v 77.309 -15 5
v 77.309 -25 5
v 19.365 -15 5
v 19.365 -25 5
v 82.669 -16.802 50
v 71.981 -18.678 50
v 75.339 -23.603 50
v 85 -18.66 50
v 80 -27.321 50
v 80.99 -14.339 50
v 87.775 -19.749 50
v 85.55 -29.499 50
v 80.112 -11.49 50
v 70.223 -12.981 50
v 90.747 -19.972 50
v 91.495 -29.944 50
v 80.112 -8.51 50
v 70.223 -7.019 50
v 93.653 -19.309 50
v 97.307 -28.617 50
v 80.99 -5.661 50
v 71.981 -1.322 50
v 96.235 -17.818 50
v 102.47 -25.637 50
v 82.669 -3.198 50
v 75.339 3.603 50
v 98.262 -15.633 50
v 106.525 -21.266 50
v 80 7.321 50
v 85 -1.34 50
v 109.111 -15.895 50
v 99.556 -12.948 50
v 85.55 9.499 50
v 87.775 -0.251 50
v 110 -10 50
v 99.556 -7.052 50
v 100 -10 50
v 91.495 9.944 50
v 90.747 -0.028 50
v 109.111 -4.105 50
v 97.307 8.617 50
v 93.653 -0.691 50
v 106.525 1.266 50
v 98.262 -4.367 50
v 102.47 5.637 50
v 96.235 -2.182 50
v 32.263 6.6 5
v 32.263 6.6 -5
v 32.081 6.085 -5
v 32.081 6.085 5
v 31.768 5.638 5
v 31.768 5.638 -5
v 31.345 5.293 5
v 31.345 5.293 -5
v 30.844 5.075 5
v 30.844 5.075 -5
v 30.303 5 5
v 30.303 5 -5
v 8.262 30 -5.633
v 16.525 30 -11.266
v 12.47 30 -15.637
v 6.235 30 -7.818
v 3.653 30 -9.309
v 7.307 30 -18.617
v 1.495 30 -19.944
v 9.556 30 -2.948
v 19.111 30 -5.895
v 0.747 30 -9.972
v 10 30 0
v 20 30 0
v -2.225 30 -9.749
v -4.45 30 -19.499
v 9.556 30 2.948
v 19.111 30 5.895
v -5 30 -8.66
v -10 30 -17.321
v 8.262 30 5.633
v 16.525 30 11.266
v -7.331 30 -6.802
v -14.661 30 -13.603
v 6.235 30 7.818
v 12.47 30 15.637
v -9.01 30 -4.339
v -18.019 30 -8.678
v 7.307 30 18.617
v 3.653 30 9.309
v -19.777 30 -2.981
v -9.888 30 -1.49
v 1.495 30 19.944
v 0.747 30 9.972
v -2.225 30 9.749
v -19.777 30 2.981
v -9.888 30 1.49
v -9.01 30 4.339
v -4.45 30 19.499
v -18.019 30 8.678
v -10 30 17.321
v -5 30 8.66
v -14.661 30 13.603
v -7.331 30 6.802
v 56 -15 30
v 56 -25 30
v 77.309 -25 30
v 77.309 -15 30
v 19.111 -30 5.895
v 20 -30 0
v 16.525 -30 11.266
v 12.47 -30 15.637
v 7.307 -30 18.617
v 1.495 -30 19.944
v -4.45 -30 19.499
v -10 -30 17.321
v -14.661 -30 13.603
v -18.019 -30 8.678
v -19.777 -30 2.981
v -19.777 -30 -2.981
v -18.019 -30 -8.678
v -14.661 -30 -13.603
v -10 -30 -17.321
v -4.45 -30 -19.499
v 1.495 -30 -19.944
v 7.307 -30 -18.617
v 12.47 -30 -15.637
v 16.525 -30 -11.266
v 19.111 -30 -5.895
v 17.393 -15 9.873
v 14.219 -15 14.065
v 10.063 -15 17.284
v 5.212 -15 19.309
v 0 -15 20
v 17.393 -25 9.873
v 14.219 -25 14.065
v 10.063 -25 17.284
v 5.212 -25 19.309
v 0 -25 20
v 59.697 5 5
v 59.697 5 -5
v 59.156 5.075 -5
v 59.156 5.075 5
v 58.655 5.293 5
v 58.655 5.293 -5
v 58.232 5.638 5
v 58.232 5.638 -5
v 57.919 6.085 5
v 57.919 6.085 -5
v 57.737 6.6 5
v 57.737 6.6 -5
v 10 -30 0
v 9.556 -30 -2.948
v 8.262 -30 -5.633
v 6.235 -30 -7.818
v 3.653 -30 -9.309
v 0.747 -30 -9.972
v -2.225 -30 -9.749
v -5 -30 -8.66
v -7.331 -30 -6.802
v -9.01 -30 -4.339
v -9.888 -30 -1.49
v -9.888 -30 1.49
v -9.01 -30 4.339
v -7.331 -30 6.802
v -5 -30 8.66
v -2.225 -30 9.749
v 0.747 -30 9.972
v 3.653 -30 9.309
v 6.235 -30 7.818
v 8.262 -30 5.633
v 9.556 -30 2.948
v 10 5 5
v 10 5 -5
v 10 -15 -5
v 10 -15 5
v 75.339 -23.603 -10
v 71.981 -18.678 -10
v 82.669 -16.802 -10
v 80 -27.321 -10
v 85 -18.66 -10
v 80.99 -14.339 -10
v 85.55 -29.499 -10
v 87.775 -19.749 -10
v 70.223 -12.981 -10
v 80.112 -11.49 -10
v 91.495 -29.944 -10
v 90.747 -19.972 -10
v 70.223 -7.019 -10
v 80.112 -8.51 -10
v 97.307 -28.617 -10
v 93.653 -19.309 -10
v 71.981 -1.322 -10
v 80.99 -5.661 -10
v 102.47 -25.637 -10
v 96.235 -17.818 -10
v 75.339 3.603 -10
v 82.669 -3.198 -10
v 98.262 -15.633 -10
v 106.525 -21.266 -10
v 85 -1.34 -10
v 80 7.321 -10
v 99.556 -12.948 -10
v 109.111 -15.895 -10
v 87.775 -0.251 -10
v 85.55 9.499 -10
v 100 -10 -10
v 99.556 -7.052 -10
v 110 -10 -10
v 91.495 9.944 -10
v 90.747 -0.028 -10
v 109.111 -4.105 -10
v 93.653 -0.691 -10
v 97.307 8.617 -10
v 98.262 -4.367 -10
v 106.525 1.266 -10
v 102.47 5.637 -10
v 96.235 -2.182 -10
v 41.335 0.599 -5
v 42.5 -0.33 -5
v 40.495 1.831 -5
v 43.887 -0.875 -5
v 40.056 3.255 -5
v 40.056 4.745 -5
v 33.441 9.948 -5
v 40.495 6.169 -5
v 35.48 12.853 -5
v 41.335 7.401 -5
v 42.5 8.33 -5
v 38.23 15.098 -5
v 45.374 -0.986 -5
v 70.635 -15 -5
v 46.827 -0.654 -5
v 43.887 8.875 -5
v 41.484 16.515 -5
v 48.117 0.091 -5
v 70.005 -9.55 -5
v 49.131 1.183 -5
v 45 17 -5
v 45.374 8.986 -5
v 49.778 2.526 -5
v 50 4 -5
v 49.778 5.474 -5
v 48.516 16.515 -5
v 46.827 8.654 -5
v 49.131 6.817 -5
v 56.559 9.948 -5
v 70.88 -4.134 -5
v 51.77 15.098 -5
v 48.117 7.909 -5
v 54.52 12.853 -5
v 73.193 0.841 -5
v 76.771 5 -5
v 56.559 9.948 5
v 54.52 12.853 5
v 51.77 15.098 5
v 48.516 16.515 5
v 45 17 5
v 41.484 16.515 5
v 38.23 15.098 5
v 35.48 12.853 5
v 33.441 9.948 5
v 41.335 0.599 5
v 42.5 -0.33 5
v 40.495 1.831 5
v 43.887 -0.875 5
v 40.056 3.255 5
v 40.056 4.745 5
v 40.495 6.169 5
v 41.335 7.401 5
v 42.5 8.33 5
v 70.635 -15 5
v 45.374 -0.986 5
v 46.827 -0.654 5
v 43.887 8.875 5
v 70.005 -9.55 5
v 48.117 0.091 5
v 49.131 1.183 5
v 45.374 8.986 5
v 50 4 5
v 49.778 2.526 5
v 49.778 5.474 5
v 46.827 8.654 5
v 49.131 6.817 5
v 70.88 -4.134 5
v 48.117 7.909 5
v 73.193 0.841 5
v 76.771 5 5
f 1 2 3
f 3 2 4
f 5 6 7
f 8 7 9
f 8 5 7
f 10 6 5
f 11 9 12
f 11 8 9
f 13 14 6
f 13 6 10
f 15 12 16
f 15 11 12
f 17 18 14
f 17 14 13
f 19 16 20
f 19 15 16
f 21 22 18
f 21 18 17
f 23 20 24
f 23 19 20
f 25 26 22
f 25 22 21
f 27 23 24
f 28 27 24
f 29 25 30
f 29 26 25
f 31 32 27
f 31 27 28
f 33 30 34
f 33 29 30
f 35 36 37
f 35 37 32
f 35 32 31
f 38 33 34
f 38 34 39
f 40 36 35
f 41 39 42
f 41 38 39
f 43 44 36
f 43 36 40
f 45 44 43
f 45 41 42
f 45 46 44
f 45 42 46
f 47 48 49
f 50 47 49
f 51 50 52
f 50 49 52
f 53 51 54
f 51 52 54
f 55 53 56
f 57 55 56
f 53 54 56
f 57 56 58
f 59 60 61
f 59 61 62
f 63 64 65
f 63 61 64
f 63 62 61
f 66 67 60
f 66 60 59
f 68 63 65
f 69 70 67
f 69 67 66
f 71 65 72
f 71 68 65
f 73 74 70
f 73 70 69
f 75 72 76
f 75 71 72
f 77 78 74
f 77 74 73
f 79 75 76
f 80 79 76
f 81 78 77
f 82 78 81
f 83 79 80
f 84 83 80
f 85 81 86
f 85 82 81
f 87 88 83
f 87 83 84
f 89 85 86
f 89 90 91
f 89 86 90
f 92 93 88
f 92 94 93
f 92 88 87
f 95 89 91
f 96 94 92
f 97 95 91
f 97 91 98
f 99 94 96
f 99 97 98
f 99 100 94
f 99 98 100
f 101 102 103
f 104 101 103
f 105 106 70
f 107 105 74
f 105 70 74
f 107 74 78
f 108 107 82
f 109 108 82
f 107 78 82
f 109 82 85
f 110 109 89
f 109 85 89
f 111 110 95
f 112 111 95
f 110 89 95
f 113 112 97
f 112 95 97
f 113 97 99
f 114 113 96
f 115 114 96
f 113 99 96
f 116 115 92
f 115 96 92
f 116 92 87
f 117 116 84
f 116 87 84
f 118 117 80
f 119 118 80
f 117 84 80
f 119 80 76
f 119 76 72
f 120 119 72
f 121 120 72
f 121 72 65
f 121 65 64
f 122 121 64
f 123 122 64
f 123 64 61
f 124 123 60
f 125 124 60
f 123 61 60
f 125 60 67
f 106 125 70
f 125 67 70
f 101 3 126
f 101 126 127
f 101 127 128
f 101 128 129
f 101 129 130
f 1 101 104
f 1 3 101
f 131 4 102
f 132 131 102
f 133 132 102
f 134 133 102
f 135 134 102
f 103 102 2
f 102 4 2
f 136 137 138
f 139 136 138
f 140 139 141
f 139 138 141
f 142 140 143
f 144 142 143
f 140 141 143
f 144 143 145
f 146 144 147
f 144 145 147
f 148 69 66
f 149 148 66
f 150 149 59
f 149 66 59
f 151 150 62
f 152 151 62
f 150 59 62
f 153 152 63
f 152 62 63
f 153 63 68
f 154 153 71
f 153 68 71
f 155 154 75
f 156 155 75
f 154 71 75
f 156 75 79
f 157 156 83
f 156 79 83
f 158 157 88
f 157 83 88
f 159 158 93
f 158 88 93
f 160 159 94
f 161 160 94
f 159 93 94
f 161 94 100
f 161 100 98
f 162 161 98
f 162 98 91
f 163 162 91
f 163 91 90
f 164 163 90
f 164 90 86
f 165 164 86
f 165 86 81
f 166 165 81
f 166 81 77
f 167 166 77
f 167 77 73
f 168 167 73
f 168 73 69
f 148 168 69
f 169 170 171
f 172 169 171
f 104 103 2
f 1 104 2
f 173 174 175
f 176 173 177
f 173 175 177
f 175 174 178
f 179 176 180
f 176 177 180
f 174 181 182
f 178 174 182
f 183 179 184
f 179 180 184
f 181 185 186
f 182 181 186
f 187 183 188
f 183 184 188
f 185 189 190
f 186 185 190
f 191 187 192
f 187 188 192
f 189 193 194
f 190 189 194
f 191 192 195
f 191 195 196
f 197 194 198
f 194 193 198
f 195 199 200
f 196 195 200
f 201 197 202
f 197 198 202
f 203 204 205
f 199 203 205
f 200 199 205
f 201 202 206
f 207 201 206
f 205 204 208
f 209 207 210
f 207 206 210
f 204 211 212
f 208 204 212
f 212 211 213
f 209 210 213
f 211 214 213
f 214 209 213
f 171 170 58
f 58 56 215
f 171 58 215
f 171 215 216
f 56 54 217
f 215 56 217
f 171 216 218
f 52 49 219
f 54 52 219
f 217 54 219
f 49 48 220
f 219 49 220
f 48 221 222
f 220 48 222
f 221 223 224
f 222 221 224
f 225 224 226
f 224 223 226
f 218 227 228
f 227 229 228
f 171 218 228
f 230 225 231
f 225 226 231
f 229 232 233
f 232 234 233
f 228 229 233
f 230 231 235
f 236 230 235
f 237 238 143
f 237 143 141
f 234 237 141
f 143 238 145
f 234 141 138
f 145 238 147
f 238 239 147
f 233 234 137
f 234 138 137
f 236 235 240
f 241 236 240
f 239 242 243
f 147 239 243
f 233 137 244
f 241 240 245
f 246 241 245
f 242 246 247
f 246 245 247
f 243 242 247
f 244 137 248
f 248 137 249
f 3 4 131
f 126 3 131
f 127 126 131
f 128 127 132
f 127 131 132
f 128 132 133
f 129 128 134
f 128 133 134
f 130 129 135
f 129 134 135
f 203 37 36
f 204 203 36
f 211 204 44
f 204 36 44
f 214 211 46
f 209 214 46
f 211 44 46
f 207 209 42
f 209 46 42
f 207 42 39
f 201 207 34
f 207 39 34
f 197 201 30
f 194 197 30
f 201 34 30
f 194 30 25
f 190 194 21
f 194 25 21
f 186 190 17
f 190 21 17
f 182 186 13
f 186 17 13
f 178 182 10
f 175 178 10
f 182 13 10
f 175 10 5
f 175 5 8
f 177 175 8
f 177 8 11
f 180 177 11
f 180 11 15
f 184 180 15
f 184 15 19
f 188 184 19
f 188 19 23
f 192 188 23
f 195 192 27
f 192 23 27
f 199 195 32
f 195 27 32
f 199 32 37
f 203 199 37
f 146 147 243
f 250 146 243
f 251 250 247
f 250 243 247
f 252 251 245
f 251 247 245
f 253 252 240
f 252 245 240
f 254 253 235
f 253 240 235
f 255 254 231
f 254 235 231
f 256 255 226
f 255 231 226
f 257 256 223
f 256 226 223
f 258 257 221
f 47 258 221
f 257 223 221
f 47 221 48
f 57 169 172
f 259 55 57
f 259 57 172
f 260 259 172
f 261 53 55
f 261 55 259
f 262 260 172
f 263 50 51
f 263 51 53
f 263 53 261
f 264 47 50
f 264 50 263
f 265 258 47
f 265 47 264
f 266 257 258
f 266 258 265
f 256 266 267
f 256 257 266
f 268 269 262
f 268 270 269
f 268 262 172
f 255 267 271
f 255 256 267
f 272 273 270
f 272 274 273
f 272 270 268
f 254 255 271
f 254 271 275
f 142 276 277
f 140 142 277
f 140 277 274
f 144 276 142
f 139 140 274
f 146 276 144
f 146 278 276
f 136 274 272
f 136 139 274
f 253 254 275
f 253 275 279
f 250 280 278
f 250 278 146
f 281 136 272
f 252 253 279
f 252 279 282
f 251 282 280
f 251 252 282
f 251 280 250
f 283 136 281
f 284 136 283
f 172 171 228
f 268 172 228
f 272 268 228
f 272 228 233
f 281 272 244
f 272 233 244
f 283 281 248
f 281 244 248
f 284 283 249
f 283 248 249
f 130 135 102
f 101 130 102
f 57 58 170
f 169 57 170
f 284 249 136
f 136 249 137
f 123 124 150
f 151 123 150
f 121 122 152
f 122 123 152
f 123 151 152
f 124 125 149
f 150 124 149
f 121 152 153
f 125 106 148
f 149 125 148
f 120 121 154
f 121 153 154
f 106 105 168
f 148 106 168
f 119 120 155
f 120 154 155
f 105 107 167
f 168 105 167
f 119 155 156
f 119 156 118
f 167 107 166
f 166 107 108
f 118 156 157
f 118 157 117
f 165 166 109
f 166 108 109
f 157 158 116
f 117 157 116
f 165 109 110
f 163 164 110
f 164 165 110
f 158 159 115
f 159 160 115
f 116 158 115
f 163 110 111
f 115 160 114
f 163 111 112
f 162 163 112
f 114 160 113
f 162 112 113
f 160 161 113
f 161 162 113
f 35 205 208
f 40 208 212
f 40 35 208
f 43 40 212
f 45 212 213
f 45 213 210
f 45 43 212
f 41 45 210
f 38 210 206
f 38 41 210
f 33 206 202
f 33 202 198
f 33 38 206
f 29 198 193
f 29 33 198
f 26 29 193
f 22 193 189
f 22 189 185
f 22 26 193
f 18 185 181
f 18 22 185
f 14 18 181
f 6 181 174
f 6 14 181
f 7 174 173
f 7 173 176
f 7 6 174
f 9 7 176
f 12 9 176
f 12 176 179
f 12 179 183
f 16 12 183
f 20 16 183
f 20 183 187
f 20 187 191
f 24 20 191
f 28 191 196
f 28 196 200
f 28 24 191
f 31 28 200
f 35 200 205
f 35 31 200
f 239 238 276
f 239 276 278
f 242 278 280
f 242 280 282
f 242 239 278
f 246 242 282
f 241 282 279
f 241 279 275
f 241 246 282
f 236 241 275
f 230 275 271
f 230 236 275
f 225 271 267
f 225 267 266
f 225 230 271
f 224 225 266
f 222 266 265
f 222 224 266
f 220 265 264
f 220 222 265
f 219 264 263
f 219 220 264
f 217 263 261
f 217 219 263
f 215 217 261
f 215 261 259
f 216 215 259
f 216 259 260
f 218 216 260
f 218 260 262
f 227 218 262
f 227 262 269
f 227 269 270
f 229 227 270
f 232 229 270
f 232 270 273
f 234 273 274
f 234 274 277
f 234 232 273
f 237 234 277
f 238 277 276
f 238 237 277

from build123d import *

# Parameters (mm, degrees)
SKETCH1_W          = 20
SKETCH1_H          = 60
SKETCH2_R          = 10
CUT_EXTRUDE1_DEPTH = 61
SKETCH3_R          = 20
SKETCH3_R_2        = 10
CYL_BLUE_DEPTH     = 60
SKETCH4_R          = 5
BASE_YELLOW_DEPTH  = 10
BASE_RED_DEPTH     = 10


with BuildPart() as part:
    # Sketch1 → cyl-purple (revolve)
    with BuildSketch(Plane.XY):
        with Locations((10, 0)):
            Rectangle(SKETCH1_W, SKETCH1_H)
    revolve(axis=Axis((0, 30, 0), (0, -1, 0)))

    # Sketch2 → Cut-Extrude1 (cut, through all)
    with BuildSketch(Plane(origin=(0, 30, 0), x_dir=(1, 0, 0), z_dir=(0, 1, 0))):
        Circle(SKETCH2_R)
    extrude(amount=-CUT_EXTRUDE1_DEPTH, mode=Mode.SUBTRACT)


with BuildPart() as body_2:
    # Sketch3 → cyl-blue (new body)
    with BuildSketch(Plane.XY.offset(50)):
        with Locations((90, -10)):
            Circle(SKETCH3_R)
        with Locations((90, -10)):
            Circle(SKETCH3_R_2, mode=Mode.SUBTRACT)
    extrude(amount=-CYL_BLUE_DEPTH)


with BuildPart() as body_3:
    # Sketch4 → base-yellow (new body)
    with BuildSketch(Plane.XY.offset(-5)):
        with BuildLine():
            Line((10, -15), (70.635083269, -15))
            ThreePointArc((70.635083269, -15), (70.879673523, -4.133730706), (76.771243445, 5))
            Line((76.771243445, 5), (59.696938457, 5))
            ThreePointArc((59.696938457, 5), (58.432027393, 5.450806662), (57.737346662, 6.6))
            ThreePointArc((57.737346662, 6.6), (45, 17), (32.262653338, 6.6))
            ThreePointArc((32.262653338, 6.6), (31.567972607, 5.450806662), (30.303061543, 5))
            Line((30.303061543, 5), (10, 5))
            Line((10, 5), (10, -15))
        make_face()
        with Locations((45, 4)):
            Circle(SKETCH4_R, mode=Mode.SUBTRACT)
    extrude(amount=BASE_YELLOW_DEPTH)


with BuildPart() as body_4:
    # Sketch6 → base-red (new body)
    with BuildSketch(Plane(origin=(0, -25, 0), x_dir=(1, 0, 0), z_dir=(0, 1, 0))):
        with BuildLine():
            Line((0, -20), (56, -30))
            Line((56, -30), (77.309100809, -30))
            Line((77.309100809, -30), (77.309100809, -5))
            Line((77.309100809, -5), (19.364916731, -5))
            ThreePointArc((19.364916731, -5), (12.247448714, -15.811388301), (0, -20))
        make_face()
    extrude(amount=BASE_RED_DEPTH)


solid = Compound([part.part, body_2.part, body_3.part, body_4.part])
